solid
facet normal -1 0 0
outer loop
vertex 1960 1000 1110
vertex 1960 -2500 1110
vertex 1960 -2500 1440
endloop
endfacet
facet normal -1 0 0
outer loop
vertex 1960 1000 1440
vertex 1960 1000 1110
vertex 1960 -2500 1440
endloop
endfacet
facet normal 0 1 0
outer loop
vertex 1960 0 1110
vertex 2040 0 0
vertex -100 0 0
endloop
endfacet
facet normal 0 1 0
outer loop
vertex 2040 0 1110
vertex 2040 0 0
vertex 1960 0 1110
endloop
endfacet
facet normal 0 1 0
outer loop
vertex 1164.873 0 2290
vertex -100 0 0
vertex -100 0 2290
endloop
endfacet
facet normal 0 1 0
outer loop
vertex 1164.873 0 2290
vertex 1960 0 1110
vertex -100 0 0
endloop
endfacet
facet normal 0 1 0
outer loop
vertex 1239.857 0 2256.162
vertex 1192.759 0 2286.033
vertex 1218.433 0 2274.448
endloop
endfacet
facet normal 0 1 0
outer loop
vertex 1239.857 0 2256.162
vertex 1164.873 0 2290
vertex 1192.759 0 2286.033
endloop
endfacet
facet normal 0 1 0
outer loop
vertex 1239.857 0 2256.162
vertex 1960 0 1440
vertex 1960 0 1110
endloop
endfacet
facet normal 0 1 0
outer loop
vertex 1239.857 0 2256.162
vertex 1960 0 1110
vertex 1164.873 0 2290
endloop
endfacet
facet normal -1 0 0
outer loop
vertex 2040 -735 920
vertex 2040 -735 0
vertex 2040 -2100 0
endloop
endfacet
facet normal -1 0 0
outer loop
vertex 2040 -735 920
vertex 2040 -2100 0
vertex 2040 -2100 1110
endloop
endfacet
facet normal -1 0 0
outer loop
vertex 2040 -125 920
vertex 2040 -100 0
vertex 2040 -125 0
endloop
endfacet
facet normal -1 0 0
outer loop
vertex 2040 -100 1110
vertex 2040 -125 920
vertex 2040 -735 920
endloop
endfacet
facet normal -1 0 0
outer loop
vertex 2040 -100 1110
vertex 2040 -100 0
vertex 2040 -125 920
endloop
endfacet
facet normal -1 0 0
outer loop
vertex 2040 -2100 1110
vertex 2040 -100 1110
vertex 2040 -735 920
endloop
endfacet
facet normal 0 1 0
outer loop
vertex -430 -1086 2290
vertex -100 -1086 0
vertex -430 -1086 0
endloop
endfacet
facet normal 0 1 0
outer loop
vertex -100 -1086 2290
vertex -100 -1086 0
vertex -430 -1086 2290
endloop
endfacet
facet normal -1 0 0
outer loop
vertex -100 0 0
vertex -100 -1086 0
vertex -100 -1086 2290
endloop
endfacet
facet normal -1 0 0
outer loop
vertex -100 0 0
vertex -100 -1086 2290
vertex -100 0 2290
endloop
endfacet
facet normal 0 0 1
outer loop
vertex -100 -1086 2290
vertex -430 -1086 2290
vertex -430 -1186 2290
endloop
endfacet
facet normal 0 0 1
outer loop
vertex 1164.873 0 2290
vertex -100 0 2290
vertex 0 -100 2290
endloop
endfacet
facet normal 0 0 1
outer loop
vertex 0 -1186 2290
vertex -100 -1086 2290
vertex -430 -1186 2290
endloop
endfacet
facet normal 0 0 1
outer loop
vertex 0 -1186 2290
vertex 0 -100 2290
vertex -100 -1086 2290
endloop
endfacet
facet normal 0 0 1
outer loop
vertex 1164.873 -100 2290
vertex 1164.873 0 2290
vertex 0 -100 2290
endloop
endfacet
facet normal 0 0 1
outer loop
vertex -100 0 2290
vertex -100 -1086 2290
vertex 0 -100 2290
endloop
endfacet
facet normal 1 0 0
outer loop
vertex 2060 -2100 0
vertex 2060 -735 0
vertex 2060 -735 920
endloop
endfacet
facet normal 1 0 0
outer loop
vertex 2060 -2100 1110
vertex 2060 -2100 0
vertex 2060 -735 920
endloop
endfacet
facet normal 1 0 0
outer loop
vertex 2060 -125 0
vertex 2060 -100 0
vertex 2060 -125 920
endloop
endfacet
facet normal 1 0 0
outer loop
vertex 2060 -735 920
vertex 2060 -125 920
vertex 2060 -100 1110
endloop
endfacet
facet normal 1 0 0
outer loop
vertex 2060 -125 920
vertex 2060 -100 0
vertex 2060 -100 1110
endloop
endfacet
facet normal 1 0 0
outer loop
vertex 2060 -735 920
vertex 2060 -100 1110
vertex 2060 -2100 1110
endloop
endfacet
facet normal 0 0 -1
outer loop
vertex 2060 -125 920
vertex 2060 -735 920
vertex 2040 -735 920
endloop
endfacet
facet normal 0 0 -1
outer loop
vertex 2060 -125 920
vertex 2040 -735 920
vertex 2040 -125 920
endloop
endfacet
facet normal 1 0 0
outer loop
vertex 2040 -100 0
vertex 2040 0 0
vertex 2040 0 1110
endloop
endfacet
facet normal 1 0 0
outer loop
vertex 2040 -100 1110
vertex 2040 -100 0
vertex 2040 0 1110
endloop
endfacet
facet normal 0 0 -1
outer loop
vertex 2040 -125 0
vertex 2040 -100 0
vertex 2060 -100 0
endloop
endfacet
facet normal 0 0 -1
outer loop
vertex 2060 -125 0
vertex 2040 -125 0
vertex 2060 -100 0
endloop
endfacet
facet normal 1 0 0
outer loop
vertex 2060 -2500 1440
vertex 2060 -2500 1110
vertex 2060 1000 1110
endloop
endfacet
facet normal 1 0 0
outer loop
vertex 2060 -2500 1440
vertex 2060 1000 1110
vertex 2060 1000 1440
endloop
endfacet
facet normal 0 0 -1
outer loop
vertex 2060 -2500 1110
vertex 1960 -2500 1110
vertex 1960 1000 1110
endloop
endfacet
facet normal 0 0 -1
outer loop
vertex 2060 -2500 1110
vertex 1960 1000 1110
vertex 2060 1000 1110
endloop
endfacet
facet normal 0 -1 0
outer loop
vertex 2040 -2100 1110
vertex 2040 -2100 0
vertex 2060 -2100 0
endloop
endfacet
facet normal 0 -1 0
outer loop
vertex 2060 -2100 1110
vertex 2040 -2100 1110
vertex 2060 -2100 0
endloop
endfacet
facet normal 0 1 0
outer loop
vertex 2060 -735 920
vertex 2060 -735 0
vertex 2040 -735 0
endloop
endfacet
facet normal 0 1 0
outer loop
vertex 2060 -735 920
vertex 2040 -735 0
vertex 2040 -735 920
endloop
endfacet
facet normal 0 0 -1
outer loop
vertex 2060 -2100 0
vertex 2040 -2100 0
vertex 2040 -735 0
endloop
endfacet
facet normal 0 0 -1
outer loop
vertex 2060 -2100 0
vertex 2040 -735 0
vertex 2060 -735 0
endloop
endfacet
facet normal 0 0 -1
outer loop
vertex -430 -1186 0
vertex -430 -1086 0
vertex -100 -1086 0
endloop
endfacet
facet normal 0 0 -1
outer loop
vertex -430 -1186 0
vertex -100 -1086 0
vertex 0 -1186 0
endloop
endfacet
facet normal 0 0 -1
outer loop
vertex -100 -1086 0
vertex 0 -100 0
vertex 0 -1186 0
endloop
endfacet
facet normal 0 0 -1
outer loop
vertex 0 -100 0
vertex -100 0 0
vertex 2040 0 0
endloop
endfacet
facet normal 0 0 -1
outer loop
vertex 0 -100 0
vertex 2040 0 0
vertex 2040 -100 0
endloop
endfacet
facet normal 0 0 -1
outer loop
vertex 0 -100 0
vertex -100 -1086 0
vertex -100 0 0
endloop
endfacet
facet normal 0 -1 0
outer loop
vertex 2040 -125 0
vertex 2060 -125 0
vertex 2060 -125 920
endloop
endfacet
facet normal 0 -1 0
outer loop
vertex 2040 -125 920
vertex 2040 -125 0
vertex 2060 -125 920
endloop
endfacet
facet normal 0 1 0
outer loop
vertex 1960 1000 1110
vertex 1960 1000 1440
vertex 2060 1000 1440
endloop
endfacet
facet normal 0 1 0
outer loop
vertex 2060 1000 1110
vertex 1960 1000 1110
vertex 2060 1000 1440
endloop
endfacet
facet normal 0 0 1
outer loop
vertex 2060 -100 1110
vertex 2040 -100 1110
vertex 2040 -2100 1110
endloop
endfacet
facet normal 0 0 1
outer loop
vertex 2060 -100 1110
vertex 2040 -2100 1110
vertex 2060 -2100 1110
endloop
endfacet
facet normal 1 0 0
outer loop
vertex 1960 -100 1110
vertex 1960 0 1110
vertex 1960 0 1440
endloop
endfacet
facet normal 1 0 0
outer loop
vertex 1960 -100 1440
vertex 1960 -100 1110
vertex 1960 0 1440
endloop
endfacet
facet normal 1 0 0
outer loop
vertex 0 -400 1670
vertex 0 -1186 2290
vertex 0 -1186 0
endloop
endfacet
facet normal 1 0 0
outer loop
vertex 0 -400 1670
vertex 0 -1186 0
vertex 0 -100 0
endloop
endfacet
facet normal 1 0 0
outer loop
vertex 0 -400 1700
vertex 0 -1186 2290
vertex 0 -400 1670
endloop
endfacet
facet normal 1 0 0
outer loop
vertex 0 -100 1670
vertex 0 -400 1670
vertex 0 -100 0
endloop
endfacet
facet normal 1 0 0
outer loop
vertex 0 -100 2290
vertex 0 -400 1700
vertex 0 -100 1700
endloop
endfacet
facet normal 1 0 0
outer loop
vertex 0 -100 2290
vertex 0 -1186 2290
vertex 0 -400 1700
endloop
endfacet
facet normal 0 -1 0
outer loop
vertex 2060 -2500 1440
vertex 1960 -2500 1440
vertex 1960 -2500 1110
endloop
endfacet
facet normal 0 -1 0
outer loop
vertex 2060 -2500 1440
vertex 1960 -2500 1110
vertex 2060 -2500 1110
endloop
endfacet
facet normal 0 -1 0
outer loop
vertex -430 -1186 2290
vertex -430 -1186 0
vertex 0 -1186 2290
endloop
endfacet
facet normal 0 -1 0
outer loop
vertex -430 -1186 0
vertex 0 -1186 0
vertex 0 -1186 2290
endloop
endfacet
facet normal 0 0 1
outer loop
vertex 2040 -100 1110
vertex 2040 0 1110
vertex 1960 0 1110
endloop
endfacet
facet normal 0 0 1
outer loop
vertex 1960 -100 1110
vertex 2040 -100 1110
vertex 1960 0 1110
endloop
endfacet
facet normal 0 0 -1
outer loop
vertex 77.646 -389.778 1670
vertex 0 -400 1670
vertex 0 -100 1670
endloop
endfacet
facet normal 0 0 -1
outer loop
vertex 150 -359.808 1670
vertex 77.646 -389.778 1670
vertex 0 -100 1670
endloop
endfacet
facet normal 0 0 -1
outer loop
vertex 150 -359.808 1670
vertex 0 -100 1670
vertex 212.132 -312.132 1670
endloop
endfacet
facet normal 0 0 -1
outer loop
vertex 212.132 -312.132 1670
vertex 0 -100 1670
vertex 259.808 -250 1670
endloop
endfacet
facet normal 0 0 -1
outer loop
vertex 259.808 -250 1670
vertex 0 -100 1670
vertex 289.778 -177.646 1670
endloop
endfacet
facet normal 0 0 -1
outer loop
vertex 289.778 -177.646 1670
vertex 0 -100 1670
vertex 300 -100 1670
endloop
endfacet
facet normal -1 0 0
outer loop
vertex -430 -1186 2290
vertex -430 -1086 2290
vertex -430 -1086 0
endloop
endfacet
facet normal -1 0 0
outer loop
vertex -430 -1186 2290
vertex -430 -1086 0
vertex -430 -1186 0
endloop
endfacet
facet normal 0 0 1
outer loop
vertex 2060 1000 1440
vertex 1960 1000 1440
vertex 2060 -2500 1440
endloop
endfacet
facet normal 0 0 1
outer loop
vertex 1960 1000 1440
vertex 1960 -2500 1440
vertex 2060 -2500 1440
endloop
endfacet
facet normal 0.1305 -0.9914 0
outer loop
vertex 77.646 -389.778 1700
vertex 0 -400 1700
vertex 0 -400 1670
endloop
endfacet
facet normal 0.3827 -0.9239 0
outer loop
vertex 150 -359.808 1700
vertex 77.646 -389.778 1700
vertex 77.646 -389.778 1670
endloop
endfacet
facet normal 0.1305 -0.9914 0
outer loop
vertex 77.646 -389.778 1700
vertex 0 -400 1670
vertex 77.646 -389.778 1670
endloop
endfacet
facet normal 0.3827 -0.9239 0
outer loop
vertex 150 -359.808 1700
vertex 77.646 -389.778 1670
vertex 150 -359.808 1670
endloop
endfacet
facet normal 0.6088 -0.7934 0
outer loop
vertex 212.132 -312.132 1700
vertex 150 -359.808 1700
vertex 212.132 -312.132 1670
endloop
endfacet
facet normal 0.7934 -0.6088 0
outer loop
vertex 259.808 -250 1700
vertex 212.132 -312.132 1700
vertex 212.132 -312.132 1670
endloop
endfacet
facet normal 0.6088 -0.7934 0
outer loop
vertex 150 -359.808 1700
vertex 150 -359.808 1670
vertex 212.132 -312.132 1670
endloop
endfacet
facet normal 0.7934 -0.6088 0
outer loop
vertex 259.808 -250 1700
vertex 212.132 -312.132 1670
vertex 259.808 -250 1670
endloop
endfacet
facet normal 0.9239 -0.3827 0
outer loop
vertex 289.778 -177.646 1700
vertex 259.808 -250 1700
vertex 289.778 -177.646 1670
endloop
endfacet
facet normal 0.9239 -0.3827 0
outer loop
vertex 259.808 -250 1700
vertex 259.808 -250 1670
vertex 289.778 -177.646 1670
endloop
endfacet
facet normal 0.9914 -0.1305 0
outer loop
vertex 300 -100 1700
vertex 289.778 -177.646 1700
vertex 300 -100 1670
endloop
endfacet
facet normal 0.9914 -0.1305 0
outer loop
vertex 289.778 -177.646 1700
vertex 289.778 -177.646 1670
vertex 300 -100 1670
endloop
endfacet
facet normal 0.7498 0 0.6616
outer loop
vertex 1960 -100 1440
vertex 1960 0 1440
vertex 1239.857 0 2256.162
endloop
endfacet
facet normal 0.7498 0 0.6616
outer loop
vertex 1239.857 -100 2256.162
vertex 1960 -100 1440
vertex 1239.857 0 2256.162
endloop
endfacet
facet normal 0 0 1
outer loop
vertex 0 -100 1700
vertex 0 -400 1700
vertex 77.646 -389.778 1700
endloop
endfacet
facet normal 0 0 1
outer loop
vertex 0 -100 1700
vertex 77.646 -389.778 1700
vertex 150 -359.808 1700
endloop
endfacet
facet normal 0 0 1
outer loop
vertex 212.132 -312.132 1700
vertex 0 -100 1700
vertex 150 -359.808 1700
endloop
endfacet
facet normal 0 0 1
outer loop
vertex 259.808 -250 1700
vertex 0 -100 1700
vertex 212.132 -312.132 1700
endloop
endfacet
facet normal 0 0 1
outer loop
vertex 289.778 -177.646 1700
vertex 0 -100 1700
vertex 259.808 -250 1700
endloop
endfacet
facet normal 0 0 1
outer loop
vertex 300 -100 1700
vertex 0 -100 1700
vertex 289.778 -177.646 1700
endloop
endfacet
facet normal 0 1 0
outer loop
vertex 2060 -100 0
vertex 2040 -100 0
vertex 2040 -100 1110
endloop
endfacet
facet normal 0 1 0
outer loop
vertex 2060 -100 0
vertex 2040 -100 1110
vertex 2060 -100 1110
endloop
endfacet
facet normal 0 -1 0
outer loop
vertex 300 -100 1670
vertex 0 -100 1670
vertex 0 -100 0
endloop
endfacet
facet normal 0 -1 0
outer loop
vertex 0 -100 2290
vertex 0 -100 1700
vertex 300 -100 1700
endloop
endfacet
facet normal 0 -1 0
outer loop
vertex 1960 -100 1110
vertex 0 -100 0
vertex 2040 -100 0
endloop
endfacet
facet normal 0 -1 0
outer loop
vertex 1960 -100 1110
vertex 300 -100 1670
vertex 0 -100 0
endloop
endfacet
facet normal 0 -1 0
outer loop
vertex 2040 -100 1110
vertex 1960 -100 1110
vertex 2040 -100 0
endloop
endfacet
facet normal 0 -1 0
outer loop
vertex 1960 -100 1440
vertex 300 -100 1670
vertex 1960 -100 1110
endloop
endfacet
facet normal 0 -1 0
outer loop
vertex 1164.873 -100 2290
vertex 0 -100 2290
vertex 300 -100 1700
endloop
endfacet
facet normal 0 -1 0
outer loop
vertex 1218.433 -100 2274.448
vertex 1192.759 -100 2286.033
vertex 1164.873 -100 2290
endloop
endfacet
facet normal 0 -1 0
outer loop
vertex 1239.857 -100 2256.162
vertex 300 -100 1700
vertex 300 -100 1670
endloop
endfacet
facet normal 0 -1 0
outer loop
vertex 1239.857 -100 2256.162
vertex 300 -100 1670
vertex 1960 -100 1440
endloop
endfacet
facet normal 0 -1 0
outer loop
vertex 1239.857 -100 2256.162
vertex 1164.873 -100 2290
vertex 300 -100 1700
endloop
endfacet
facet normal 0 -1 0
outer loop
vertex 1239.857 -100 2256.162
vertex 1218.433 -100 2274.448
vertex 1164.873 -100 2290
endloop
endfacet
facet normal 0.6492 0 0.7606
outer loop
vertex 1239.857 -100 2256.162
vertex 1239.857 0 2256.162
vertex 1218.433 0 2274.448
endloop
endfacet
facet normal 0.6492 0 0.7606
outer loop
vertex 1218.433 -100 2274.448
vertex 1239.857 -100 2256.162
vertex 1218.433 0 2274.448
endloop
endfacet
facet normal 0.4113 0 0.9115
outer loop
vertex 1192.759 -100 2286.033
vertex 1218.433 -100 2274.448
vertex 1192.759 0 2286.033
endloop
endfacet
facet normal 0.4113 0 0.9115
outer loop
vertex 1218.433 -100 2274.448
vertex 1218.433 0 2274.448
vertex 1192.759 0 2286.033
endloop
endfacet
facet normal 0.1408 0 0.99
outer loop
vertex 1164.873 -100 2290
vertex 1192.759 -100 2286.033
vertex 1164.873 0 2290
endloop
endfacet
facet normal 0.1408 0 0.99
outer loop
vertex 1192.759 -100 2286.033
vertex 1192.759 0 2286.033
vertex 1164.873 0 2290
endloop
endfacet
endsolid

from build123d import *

# Parameters (mm, degrees)
F1_DEPTH      = 100
F2_W          = 1186
F2_H          = 2290
F3_DEPTH      = 100
F4_W          = 100
F4_H          = 330
F5_DEPTH      = 2500
F5_DEPTH_BACK = 1000
F6_W          = 100
F6_H          = 2290
F7_DEPTH      = 330
F8_W          = 20
F8_H          = 1110
F9_DEPTH      = 2000
F10_W         = 610
F10_H         = 920
F11_DEPTH     = 20
F13_START     = 1670
F13_DEPTH     = 30


with BuildPart() as f1:
    # F0 (on Front) → F1 (new body)
    with BuildSketch(Plane.XZ):
        with BuildLine():
            Line((1164.8731288382, 2290), (0, 2290))
            Line((0, 2290), (0, 0))
            Line((0, 0), (2040, 0))
            Line((2040, 0), (2040, 1110))
            Line((2040, 1110), (1960, 1110))
            Line((1960, 1110), (1960, 1440))
            Line((1960, 1440), (1239.8569143747, 2256.1621637087))
            ThreePointArc((1239.8569143747, 2256.1621637087), (1206.0057413806, 2281.1488243777), (1164.8731288382, 2290))
        make_face()
    extrude(amount=F1_DEPTH)

    # F2 (on Right) → F3 (join)
    with BuildSketch(Plane.YZ):
        with Locations((-593, 1145)):
            Rectangle(F2_W, F2_H)
    extrude(amount=-F3_DEPTH)

    # F6 (on face) → F7 (join)
    with BuildSketch(Plane(origin=(-100, 0, 0), x_dir=(0, -1, 0), z_dir=(-1, 0, 0))):
        with Locations((1136, 1145)):
            Rectangle(F6_W, F6_H)
    extrude(amount=F7_DEPTH)

    # F12 (on Top) → F13 (join)
    with BuildSketch(Plane.XY.offset(F13_START)):
        with BuildLine():
            Line((300, -100), (0, -100))
            Line((0, -100), (0, -400))
            ThreePointArc((0, -400), (212.132034356, -312.132034356), (300, -100))
        make_face()
    extrude(amount=F13_DEPTH)


with BuildPart() as f5:
    # F4 (on Front) → F5 (new body, two sides)
    with BuildSketch(Plane.XZ) as f5_sk:
        with Locations((2010, 1275)):
            Rectangle(F4_W, F4_H)
    extrude(amount=F5_DEPTH)
    extrude(f5_sk.sketch, amount=-F5_DEPTH_BACK)


with BuildPart() as f9:
    # F8 (on face) → F9 (new body)
    with BuildSketch(Plane.XZ.offset(100)):
        with Locations((2050, 555)):
            Rectangle(F8_W, F8_H)
    extrude(amount=F9_DEPTH)

    # F10 (on face) → F11 (cut)
    with BuildSketch(Plane.YZ.offset(2060)):
        with Locations((-430, 460)):
            Rectangle(F10_W, F10_H)
    extrude(amount=-F11_DEPTH, mode=Mode.SUBTRACT)


solid = Compound([f1.part, f5.part, f9.part])
